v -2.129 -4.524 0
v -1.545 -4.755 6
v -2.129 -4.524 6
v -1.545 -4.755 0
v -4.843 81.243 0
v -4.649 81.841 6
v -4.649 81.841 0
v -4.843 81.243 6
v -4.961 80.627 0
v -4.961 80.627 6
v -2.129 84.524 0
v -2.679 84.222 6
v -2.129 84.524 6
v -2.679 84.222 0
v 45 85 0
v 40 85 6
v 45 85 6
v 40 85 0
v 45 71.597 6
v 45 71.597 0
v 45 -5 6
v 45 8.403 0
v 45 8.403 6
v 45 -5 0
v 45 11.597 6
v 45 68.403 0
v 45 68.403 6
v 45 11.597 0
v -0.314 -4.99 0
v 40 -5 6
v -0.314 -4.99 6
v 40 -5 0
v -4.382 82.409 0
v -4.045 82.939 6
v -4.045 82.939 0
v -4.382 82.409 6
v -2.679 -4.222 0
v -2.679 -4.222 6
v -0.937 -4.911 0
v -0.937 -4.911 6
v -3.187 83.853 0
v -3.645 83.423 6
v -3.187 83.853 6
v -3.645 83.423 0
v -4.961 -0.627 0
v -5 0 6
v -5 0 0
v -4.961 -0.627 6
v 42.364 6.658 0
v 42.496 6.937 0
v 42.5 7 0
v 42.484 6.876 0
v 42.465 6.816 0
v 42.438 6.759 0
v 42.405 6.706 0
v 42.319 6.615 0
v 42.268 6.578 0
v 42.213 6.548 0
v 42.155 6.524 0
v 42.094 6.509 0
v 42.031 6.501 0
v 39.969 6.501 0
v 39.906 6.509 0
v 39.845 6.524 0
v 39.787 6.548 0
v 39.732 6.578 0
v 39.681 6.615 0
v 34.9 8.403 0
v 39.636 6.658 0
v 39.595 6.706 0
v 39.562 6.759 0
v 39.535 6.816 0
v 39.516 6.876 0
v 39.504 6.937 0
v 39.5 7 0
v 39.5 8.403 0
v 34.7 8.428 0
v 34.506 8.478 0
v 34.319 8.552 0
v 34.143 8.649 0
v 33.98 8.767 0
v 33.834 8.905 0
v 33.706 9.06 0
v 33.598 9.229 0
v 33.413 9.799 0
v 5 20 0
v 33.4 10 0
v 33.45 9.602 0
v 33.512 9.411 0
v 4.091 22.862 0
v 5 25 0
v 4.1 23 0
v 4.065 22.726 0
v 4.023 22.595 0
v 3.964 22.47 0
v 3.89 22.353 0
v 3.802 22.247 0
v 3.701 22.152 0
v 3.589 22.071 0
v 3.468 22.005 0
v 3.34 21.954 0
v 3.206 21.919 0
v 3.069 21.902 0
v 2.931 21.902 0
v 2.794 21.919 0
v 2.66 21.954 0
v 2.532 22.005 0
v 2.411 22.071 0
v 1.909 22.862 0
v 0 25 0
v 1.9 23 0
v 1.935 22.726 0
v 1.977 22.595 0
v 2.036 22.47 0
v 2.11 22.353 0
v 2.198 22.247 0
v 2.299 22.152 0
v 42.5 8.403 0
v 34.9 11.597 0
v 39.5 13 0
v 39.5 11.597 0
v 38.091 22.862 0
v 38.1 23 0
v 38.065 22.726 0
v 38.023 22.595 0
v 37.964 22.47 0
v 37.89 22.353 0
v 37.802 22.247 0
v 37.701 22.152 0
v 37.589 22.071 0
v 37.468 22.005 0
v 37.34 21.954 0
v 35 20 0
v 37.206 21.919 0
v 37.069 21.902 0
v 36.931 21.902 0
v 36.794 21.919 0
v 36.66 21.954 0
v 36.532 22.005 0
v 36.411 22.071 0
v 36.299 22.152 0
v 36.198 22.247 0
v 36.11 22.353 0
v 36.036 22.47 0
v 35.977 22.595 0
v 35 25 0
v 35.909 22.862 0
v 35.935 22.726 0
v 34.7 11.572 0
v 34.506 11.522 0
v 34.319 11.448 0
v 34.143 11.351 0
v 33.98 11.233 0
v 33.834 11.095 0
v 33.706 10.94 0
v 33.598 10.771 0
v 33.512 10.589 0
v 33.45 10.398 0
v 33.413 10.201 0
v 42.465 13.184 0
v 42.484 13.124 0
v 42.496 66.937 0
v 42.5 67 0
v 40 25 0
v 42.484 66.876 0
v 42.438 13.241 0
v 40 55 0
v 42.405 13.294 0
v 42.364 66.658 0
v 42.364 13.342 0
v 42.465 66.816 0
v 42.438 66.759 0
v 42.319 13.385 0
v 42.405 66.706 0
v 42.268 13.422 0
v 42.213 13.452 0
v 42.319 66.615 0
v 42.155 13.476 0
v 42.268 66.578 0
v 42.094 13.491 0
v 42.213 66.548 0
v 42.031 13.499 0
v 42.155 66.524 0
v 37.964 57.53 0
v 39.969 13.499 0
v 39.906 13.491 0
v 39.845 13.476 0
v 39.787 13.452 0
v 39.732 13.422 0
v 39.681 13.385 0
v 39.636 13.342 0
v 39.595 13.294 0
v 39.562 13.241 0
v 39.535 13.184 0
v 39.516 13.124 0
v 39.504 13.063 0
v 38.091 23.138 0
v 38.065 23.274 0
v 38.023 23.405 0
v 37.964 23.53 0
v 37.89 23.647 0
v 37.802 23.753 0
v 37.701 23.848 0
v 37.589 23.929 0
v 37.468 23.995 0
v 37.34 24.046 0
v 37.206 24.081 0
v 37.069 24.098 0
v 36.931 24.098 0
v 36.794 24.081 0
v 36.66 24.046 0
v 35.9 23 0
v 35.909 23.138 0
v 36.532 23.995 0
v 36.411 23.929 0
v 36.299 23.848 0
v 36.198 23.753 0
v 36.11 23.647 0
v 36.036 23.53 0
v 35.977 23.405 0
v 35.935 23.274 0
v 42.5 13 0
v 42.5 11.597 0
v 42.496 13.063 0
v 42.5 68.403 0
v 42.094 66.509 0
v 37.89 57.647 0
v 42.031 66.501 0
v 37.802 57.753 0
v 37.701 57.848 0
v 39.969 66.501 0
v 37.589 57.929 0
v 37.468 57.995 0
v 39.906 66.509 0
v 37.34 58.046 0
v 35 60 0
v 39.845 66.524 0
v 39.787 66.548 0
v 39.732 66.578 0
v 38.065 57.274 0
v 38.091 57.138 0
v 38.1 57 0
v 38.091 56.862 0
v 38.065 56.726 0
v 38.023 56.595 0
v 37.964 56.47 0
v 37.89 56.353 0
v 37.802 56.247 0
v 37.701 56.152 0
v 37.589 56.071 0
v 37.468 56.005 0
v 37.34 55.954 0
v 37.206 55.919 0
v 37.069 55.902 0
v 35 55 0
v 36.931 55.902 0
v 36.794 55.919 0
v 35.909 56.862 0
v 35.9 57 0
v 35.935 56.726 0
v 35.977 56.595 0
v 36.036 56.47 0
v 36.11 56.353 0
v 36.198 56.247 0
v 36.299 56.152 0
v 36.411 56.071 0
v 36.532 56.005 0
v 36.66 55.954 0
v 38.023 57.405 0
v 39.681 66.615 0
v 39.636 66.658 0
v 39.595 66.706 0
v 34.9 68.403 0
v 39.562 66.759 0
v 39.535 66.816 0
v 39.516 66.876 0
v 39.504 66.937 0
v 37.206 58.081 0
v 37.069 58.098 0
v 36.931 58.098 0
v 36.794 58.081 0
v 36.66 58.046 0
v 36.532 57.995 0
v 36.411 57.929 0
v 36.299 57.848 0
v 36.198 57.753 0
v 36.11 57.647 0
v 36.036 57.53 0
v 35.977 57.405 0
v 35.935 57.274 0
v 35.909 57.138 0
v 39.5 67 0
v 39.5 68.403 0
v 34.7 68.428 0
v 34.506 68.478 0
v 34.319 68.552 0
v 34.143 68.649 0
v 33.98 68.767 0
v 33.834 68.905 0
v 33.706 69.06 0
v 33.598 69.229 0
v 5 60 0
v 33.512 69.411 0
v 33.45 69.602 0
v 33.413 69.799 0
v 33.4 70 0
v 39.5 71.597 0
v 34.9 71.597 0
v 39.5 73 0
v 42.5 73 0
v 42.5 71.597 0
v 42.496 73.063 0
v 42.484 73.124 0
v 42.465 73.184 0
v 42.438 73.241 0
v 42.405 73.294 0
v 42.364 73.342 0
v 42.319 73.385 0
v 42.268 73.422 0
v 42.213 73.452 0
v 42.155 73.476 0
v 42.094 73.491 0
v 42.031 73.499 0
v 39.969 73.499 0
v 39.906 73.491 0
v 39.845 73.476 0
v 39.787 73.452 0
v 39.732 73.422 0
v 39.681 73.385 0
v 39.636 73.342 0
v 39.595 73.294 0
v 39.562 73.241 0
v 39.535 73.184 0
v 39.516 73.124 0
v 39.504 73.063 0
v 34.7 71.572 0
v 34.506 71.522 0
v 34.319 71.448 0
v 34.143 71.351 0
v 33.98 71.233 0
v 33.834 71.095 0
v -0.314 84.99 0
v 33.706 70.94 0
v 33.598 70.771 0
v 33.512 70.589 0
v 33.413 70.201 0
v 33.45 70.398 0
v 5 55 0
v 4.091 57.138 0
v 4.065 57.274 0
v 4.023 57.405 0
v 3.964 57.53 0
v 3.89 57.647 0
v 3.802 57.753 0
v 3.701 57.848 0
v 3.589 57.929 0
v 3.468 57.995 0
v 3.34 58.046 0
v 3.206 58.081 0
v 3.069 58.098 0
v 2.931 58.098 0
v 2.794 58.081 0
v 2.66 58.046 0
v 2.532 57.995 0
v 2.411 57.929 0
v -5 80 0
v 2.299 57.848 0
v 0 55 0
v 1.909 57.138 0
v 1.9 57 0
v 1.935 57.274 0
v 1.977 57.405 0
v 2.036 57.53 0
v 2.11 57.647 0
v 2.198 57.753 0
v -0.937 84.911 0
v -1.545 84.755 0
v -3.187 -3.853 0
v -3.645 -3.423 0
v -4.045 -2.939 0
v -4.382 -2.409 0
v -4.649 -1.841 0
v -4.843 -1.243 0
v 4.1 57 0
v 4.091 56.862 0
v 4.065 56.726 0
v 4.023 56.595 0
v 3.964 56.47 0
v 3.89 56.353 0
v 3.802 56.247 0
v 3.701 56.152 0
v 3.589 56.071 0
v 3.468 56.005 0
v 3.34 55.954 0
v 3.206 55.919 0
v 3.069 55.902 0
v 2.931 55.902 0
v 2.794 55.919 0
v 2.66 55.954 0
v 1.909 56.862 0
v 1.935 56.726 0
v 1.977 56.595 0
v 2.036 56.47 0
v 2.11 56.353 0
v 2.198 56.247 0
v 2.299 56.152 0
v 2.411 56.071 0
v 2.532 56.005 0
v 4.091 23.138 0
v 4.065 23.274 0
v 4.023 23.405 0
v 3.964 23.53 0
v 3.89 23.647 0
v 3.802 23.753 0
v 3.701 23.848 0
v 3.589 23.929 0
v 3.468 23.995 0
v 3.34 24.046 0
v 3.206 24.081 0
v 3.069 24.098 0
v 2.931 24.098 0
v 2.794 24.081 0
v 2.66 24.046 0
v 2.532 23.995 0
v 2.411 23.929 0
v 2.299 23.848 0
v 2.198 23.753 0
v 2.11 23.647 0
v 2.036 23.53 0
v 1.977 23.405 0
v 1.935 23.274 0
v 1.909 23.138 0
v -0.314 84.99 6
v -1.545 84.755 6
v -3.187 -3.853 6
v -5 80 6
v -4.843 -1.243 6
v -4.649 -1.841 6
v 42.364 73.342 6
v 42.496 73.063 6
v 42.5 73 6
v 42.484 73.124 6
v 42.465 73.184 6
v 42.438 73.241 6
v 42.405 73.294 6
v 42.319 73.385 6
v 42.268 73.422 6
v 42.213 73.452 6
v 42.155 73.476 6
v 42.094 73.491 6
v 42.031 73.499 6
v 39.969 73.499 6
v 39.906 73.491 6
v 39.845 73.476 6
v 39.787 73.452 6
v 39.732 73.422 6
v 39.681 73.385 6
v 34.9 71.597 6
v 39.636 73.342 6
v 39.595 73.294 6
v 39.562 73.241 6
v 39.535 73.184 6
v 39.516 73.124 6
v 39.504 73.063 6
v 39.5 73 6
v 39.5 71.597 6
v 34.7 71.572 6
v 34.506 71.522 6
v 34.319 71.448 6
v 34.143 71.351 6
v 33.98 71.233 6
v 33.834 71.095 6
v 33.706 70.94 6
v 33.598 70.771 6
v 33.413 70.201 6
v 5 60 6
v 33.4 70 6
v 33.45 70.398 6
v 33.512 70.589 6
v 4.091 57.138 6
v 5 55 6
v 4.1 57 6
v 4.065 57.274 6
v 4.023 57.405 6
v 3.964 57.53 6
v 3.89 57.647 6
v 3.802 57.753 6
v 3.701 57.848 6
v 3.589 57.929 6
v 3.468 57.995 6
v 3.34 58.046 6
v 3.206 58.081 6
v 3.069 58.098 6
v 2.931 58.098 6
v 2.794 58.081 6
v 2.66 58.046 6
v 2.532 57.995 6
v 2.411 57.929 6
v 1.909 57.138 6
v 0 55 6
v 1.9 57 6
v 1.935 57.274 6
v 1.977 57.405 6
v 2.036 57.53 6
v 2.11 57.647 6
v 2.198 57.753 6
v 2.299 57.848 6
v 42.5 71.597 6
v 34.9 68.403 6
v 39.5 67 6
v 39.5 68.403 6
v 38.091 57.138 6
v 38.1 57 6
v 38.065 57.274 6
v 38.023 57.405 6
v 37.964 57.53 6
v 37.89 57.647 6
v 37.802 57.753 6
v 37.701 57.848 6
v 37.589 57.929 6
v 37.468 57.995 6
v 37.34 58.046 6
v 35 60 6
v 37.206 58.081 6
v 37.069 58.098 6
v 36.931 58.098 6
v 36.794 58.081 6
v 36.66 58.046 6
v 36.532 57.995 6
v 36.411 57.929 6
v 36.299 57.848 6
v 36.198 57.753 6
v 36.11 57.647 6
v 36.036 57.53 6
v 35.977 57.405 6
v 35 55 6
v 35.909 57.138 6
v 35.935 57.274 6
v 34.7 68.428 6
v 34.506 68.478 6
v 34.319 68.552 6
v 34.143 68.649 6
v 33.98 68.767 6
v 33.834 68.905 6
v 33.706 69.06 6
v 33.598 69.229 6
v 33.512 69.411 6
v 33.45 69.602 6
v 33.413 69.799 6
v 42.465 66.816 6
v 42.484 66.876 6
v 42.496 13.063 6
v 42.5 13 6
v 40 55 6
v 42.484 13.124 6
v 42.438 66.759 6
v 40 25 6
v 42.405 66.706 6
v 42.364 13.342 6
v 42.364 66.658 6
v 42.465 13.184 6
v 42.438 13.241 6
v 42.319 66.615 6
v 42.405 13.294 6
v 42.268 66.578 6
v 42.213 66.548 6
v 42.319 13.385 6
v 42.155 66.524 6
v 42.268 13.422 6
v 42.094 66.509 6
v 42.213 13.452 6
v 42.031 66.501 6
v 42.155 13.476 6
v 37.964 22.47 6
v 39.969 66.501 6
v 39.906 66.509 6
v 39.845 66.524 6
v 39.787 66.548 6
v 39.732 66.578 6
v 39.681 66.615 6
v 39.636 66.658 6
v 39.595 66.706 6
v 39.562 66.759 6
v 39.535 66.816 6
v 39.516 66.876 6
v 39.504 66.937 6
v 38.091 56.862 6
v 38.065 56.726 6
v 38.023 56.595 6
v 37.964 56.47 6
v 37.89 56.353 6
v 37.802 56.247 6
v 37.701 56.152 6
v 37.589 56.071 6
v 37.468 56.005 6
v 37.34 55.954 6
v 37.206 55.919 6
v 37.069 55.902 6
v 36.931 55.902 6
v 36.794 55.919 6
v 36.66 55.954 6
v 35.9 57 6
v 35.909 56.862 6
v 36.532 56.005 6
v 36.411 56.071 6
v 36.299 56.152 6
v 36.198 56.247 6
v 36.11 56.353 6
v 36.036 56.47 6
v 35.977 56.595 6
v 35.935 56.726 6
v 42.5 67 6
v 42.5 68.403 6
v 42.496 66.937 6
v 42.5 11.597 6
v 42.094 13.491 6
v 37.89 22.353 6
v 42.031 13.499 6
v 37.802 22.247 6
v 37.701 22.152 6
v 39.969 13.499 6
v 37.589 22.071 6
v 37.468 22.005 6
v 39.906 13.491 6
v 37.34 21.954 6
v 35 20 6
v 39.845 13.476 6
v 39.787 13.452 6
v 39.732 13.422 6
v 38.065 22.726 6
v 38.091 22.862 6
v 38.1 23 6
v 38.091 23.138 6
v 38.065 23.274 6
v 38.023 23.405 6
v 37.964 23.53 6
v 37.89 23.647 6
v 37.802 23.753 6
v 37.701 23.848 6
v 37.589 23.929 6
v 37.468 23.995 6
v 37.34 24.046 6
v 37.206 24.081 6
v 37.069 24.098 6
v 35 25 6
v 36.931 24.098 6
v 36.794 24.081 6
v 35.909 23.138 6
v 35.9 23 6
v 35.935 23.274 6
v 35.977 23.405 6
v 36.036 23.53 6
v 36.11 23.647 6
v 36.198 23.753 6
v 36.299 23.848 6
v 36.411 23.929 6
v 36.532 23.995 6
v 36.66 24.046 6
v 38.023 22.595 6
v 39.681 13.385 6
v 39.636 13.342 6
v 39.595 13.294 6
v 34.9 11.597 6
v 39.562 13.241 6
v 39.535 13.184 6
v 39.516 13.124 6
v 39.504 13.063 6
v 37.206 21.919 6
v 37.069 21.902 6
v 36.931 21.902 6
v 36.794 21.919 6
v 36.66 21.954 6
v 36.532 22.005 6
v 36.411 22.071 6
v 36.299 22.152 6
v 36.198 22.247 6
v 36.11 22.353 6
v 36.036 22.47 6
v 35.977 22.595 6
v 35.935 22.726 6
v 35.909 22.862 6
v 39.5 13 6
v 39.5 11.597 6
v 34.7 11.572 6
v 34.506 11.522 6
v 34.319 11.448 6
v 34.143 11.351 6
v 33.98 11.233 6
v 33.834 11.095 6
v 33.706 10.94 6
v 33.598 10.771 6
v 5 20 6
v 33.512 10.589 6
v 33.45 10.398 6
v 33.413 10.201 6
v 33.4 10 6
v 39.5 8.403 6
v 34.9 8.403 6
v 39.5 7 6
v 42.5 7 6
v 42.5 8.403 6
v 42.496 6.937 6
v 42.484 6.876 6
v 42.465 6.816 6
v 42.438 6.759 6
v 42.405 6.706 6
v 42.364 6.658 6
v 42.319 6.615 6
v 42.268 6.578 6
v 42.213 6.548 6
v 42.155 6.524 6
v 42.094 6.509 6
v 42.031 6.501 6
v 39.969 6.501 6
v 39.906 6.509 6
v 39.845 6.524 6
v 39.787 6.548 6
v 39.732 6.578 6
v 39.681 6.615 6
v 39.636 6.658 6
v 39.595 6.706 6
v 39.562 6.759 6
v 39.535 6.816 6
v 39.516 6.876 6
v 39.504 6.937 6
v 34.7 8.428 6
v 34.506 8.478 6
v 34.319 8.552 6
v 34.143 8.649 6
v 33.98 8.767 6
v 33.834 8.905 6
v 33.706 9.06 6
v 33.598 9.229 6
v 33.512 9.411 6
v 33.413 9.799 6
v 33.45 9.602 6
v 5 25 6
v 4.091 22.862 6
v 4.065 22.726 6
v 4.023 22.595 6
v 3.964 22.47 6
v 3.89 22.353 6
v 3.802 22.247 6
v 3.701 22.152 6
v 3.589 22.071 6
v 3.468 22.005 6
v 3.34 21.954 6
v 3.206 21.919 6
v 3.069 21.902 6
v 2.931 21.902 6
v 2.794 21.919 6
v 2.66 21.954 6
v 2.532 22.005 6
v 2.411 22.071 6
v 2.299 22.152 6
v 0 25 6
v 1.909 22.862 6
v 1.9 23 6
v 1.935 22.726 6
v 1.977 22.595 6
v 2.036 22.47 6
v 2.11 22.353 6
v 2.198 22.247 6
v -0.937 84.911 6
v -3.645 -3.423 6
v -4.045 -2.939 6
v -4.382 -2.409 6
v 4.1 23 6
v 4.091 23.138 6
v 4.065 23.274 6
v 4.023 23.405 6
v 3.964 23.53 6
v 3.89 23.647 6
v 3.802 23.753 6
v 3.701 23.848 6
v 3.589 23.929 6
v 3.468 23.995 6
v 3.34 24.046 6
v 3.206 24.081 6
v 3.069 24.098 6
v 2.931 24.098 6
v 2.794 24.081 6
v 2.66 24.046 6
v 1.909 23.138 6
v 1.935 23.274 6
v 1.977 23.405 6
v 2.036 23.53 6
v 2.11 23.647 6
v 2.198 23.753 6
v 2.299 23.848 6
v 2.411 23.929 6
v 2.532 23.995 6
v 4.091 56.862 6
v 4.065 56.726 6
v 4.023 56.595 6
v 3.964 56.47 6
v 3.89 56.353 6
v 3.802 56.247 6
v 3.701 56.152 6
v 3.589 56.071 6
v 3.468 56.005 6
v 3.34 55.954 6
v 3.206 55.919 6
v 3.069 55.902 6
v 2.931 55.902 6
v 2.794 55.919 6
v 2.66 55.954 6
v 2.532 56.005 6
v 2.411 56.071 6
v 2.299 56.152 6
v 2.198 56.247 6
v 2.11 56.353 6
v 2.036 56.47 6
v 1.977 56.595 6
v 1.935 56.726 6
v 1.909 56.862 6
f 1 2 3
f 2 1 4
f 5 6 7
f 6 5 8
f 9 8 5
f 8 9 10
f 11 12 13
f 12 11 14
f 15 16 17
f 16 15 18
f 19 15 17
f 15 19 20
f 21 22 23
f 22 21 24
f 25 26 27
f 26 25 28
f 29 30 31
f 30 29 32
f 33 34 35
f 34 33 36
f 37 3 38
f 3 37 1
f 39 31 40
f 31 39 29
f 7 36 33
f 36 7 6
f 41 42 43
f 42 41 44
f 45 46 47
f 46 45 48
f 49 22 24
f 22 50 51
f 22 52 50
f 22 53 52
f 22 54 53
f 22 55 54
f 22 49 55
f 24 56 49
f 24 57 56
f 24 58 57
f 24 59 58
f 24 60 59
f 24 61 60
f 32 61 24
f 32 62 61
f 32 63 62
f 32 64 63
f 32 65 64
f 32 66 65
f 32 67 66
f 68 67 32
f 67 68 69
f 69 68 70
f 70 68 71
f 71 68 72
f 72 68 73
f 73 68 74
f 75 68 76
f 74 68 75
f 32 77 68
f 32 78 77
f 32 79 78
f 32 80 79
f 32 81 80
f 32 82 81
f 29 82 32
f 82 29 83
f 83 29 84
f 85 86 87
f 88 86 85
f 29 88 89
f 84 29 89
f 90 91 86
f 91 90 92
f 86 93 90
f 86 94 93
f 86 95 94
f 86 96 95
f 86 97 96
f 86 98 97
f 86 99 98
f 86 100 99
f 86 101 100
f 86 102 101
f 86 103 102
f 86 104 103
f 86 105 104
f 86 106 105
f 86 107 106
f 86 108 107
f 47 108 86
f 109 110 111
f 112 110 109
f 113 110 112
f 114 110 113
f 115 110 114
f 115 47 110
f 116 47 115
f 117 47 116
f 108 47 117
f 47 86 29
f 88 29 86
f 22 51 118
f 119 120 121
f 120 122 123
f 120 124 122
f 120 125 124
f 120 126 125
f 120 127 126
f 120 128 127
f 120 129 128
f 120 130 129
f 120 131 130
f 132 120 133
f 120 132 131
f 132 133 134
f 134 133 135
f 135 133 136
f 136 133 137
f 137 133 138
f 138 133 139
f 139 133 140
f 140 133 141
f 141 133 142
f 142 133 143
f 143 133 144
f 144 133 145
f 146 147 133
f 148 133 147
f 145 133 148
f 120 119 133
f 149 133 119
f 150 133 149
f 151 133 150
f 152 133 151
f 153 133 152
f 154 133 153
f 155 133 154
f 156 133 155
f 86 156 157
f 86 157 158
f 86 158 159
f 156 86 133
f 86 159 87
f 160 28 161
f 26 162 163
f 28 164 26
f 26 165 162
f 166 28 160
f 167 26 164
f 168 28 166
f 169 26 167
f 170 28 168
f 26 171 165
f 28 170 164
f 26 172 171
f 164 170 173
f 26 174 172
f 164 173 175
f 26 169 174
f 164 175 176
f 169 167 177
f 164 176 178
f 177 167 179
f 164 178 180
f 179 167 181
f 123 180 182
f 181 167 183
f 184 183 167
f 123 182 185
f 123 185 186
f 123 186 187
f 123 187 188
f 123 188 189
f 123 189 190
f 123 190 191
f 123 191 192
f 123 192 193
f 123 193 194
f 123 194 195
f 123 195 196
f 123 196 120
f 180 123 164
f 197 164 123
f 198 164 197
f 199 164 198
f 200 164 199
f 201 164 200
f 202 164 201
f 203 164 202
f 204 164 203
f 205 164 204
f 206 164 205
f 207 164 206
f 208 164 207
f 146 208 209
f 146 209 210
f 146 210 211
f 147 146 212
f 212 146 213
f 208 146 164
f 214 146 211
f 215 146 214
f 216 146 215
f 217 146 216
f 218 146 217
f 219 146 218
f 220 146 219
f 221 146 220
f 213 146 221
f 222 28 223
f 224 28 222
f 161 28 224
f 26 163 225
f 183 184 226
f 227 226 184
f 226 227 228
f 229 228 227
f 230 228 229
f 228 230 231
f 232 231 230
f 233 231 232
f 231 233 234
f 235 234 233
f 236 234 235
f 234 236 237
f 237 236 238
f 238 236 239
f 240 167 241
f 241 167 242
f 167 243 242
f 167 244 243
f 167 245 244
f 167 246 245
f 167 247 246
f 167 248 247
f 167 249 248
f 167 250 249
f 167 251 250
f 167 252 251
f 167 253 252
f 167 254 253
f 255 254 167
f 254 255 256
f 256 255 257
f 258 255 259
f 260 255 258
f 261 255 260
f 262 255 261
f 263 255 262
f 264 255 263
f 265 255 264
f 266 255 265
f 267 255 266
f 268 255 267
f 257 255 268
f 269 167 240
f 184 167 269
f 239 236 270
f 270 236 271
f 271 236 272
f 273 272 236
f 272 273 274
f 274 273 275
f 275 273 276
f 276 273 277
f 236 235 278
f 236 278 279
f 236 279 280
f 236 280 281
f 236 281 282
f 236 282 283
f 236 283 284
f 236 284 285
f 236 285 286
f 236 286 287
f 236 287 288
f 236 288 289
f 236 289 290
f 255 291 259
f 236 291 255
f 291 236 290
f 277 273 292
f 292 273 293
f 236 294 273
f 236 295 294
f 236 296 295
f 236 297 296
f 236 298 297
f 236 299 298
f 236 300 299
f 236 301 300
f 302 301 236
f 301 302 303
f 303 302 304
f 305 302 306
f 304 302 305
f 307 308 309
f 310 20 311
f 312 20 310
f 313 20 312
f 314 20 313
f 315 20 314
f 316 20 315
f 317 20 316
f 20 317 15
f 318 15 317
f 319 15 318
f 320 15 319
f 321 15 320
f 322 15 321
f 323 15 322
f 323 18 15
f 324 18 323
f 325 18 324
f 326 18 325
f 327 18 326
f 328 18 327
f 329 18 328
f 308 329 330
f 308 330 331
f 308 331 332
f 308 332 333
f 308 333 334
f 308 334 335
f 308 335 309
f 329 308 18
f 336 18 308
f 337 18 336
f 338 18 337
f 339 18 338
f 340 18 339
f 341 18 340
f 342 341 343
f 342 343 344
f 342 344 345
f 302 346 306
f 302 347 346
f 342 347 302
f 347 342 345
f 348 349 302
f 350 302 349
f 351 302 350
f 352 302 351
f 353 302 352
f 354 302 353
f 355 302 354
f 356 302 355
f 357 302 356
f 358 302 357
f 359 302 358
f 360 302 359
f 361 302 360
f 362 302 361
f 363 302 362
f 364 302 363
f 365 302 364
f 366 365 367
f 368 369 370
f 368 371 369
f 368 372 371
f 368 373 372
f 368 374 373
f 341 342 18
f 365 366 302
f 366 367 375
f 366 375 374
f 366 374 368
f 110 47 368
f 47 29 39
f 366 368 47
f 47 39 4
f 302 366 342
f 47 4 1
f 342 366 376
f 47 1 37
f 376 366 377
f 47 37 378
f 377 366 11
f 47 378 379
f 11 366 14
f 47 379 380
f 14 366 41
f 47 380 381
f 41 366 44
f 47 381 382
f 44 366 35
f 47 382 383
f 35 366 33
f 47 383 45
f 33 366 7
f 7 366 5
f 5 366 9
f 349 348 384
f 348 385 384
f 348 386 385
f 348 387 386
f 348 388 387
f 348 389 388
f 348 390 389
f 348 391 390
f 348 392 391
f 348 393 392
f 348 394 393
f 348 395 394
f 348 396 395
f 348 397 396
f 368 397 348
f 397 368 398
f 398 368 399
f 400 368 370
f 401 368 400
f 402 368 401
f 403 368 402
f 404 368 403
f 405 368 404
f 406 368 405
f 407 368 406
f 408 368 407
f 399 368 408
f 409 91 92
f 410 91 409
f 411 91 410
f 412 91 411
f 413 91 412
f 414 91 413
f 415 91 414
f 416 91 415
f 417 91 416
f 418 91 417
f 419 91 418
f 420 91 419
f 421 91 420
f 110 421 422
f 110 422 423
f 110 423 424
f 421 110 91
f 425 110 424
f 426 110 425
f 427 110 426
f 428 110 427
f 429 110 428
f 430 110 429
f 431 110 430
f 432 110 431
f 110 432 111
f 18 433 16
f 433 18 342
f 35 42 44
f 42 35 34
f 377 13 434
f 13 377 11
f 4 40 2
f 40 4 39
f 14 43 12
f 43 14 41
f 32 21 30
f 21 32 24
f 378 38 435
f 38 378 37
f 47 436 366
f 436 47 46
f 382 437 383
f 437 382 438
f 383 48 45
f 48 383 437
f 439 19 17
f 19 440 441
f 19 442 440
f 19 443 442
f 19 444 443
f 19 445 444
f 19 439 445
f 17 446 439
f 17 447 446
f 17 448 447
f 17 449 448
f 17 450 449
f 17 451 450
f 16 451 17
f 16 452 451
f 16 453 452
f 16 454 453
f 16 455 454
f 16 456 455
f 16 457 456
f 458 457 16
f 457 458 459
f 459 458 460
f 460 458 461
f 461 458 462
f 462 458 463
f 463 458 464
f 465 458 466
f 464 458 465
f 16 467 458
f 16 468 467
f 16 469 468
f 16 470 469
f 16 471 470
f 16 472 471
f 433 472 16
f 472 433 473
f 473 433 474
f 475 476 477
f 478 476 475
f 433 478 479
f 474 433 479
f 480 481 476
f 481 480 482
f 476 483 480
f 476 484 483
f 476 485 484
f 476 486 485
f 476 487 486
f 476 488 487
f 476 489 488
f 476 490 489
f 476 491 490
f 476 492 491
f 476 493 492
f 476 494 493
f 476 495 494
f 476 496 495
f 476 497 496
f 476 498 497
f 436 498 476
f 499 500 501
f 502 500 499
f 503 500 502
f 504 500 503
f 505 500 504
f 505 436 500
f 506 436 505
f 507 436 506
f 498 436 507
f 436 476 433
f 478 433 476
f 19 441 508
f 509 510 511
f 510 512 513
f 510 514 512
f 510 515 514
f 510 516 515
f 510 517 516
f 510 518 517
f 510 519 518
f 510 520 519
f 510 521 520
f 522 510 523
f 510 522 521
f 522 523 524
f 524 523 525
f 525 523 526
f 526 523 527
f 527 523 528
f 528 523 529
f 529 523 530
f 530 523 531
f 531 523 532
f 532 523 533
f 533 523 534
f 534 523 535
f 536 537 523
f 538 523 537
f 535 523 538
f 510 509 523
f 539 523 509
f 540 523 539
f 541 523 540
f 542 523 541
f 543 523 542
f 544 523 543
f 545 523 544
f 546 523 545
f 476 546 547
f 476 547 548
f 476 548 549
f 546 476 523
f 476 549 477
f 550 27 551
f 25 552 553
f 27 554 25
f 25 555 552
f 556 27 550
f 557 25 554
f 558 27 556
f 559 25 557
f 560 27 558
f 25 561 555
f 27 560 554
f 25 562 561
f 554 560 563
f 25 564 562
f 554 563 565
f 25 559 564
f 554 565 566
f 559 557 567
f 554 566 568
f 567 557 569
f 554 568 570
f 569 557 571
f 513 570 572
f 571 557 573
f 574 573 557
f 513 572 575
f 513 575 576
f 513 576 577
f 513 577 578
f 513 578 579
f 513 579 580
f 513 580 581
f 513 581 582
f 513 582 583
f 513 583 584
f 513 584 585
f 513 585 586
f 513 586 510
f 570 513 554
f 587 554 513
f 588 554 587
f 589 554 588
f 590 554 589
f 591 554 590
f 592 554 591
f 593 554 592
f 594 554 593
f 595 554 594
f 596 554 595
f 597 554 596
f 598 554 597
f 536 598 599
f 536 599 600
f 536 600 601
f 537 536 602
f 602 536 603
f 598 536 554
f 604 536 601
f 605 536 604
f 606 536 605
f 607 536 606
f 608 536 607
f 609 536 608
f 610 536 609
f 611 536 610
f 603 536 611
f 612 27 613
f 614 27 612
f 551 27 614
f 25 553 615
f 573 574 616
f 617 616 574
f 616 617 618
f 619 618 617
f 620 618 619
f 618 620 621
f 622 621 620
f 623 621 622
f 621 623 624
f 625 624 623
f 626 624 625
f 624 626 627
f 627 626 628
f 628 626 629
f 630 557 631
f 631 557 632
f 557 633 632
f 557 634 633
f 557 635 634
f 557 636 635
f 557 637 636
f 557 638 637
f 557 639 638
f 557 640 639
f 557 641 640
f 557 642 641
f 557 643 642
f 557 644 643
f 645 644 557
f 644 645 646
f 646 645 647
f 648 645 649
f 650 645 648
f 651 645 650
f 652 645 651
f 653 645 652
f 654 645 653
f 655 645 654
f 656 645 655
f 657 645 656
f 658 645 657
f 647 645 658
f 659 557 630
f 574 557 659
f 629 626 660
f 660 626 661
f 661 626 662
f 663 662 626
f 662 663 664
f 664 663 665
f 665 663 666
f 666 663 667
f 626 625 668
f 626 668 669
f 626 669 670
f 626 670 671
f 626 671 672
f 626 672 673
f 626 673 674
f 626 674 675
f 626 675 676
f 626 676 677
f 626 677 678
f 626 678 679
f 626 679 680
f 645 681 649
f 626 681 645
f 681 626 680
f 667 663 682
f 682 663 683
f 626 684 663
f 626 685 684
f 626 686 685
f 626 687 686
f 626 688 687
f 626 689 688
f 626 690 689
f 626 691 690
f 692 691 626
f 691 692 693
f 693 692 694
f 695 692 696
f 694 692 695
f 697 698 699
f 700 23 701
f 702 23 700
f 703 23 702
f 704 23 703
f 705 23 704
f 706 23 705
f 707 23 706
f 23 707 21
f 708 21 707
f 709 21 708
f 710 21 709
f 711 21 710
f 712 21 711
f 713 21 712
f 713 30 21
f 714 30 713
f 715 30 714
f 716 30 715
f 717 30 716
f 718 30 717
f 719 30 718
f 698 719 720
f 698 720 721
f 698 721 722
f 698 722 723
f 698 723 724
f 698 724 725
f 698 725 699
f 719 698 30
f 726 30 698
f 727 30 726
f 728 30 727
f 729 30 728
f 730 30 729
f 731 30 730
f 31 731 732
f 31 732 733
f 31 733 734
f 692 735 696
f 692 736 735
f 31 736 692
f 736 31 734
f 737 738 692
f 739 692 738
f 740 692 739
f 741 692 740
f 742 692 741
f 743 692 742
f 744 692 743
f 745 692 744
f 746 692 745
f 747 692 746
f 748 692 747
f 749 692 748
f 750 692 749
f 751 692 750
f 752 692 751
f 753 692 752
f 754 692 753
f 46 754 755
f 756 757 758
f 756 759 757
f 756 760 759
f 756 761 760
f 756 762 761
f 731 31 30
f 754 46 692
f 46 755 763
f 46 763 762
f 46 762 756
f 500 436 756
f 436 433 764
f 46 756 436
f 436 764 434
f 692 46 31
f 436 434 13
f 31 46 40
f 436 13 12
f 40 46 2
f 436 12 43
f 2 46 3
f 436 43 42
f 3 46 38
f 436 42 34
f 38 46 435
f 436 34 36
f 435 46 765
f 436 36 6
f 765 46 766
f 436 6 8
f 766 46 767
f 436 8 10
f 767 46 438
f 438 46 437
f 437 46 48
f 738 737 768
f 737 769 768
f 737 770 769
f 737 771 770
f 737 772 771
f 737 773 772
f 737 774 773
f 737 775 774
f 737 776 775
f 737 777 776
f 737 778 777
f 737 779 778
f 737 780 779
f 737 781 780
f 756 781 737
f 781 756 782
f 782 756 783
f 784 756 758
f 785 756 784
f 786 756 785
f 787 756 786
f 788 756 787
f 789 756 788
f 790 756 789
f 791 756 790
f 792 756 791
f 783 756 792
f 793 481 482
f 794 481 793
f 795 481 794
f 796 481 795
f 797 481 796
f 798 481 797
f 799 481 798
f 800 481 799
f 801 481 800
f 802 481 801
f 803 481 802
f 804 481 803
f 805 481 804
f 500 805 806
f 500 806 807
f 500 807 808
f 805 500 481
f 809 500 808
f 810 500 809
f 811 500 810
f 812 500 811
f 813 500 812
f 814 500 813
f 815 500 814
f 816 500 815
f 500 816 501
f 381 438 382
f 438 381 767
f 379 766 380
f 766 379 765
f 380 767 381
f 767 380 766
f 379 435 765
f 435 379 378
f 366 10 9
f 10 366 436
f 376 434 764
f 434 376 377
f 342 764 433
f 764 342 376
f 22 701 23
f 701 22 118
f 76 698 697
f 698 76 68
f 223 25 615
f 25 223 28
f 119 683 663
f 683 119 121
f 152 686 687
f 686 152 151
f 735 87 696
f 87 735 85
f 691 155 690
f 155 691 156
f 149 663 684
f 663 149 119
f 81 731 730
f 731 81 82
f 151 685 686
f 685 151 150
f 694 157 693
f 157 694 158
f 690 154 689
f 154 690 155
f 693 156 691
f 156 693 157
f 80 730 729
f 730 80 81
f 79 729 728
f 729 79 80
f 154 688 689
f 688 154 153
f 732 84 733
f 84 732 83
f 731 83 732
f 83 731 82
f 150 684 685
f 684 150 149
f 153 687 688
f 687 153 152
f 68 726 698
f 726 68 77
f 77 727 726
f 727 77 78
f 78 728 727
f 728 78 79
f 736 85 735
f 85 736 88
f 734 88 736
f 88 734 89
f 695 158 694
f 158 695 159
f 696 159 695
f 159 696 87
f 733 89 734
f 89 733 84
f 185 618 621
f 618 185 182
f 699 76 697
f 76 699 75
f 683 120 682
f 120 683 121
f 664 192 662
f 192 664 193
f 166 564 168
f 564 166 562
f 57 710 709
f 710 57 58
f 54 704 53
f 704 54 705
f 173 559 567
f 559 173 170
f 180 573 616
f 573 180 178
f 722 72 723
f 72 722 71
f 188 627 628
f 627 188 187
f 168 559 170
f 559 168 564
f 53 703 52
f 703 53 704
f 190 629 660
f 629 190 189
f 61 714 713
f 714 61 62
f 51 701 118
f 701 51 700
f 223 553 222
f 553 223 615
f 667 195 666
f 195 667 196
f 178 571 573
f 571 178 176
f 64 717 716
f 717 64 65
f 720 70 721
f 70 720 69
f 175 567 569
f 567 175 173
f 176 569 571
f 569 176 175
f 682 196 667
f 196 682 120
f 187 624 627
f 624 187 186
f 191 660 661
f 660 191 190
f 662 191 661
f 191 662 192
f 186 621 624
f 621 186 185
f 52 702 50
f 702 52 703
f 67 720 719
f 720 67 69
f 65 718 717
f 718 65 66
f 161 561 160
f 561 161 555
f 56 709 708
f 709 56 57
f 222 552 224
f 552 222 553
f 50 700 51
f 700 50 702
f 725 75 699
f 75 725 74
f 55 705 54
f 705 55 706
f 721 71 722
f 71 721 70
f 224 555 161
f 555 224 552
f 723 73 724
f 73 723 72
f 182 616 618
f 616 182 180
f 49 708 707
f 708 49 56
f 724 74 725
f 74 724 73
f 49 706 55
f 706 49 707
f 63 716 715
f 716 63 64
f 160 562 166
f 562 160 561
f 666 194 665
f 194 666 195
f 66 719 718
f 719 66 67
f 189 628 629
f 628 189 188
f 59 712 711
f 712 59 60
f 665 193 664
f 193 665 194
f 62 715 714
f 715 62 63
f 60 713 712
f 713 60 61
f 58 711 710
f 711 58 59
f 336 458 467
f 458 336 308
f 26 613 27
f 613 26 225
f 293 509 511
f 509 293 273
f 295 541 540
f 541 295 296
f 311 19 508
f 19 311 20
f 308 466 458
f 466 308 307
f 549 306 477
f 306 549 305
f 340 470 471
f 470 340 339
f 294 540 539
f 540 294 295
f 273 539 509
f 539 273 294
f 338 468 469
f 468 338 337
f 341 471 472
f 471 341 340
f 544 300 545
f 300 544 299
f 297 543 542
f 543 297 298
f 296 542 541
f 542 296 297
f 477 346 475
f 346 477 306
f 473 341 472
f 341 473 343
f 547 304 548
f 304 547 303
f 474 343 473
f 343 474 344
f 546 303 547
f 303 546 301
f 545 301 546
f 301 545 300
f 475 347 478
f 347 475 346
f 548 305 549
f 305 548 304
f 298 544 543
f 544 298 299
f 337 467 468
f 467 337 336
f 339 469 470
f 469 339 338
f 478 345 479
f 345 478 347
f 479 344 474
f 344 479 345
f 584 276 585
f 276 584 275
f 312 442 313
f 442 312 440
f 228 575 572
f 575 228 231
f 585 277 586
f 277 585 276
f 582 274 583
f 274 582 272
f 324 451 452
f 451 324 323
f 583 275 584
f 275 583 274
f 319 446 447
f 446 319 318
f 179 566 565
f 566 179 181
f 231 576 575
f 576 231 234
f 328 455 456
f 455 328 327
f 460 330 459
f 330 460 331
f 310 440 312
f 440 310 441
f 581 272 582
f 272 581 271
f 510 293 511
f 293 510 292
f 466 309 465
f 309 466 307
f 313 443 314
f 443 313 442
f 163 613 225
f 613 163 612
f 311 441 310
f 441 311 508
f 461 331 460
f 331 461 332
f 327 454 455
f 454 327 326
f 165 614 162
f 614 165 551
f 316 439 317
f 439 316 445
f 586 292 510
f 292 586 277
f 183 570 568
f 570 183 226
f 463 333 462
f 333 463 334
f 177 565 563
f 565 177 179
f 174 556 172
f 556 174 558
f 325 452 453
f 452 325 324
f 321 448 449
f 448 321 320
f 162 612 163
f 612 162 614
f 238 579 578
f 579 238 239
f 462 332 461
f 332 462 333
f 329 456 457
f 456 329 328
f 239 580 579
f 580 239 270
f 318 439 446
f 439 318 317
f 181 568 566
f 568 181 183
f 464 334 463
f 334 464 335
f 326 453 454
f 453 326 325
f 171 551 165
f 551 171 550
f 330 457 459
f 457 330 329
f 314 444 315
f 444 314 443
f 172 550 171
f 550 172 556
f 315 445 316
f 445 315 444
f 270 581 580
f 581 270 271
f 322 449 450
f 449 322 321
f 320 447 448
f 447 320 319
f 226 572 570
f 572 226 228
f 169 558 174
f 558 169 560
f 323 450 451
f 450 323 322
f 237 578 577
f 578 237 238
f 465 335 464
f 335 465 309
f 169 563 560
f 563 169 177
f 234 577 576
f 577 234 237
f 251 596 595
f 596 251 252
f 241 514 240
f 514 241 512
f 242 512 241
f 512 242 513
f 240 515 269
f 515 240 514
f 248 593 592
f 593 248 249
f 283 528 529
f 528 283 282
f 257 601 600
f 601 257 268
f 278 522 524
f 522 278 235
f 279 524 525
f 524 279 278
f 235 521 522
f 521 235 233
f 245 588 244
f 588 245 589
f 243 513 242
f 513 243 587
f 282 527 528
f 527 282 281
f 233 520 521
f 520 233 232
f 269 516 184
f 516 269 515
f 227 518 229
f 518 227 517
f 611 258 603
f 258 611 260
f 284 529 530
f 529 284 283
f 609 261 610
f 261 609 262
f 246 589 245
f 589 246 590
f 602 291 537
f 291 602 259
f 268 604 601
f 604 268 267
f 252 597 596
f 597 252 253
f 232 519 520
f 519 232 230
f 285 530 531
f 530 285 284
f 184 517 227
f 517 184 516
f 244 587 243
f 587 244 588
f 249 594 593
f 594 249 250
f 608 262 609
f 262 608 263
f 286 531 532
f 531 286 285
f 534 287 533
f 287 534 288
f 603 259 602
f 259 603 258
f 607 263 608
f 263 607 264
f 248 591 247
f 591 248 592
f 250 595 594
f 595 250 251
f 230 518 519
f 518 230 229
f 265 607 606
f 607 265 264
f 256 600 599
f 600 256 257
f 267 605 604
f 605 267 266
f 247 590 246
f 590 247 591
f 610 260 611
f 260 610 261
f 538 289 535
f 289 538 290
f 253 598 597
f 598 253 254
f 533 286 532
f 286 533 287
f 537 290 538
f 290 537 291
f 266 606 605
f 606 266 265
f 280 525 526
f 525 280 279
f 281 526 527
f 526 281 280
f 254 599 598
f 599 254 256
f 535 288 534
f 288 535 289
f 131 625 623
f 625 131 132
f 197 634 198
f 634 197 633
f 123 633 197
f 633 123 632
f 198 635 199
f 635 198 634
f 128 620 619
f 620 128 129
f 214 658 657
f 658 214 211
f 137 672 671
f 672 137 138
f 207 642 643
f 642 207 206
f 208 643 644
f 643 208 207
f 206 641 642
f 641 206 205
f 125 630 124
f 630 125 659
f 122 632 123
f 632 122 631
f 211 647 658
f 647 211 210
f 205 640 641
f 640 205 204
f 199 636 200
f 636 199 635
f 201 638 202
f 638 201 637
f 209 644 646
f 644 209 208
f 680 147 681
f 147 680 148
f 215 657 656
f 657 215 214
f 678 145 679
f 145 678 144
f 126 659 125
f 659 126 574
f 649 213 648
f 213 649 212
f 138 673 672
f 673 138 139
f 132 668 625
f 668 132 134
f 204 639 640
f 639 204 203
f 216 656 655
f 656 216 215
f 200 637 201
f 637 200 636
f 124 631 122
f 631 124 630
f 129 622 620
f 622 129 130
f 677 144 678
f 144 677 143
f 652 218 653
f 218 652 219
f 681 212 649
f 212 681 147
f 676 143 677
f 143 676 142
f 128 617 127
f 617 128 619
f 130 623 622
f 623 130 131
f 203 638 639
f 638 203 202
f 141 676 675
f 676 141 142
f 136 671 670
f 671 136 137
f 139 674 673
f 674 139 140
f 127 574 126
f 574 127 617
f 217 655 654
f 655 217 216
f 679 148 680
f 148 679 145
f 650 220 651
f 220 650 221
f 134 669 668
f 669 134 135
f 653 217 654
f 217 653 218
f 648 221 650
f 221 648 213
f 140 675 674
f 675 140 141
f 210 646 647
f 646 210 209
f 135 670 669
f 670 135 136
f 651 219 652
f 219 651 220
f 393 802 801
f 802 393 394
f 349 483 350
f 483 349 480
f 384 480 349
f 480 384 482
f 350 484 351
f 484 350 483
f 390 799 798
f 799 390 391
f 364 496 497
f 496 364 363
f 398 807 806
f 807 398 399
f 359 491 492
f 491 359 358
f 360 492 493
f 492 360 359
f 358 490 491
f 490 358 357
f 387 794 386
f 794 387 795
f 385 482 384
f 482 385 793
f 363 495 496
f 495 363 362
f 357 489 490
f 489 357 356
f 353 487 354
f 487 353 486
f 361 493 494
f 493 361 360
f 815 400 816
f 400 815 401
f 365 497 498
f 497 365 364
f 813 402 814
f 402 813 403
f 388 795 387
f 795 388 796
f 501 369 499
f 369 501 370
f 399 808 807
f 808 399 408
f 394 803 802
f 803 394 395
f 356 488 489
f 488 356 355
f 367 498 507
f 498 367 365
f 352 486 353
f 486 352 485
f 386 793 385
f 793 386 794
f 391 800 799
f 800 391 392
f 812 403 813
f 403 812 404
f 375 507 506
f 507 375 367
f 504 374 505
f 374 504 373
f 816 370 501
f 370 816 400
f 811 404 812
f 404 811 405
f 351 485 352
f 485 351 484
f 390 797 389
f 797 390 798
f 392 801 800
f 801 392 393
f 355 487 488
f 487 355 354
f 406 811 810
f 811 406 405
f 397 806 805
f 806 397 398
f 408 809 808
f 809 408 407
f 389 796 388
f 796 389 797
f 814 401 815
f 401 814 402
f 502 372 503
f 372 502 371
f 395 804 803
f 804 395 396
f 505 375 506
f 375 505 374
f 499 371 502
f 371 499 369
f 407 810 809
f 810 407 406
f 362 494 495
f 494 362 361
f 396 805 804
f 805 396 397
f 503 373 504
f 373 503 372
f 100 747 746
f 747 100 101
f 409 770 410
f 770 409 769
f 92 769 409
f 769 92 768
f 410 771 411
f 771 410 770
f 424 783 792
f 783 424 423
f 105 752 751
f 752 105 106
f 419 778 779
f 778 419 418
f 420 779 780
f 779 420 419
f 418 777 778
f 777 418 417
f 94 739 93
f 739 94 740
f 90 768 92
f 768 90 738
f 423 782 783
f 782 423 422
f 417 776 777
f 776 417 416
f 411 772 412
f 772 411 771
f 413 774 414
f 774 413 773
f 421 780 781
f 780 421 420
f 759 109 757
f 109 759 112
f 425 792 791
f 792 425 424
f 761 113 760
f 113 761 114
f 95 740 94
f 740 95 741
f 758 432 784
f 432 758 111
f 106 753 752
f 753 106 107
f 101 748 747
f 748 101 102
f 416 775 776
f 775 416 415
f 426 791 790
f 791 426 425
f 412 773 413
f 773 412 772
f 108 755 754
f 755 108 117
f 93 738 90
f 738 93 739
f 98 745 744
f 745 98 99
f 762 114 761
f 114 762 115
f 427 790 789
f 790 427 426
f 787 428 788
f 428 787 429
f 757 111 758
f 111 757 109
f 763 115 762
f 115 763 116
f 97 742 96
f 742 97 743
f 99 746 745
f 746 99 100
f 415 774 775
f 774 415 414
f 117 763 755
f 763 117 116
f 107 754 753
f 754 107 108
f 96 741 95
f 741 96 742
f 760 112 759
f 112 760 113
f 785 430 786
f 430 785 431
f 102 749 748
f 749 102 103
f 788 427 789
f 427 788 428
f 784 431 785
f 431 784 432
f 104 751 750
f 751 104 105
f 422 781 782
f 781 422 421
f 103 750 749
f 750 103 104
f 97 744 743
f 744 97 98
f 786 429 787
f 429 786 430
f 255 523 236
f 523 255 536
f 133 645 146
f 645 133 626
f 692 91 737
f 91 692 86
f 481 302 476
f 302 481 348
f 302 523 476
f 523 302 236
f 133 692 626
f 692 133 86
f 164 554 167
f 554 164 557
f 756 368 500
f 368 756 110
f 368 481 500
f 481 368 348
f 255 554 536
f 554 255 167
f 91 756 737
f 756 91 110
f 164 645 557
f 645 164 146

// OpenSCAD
$cameraholes=34;

module cam() {
	// pcb:
	translate([-cx/2, -cy/2, 0]) {
	color("DarkSlateBlue") 
	difference() {
		cube([cx,cy,1]);
		
		translate([5,5,-1]) cylinder(d=2.5,h=6);
		translate([5,5+28,-1]) cylinder(d=2.5,h=6);
		translate([5+28,5+28,-1]) cylinder(d=2.5,h=6);
		translate([5+28,5,-1]) cylinder(d=2.5,h=6);
	}
	// m12 lens block:
	color([0.1,0.1,0.1]) {
		translate([cx/2, cy/2, 1]) cylinder(d=14,h=20);
	}
	}
}

$fn=50;
$thickness=6;
$width=80;
$depth=40;
$drill3=3.2;
$drill2=2.2;

difference() {
    hull() {
        translate([0,0,0]) cylinder(r=5,h=$thickness);
        translate([0,$width,0]) cylinder(r=5,h=$thickness);
        translate([$depth,-5,0]) cube([5,5,$thickness]);
        translate([$depth,$width,0]) cube([5,5,$thickness]);
    }

    // Captive nuts
    hull() {
        translate([$depth-5,10,-1]) cylinder(r=$drill3/2,h=$thickness+2);
        translate([$depth+10,10,-1]) cylinder(r=$drill3/2,h=$thickness+2);
    }
    hull() {
        translate([$depth+0,10-3,-1]) cylinder(r=0.5,h=$thickness+2);
        translate([$depth+0,10+3,-1]) cylinder(r=0.5,h=$thickness+2);
        translate([$depth+2,10-3,-1]) cylinder(r=0.5,h=$thickness+2);
        translate([$depth+2,10+3,-1]) cylinder(r=0.5,h=$thickness+2);
    }
    hull() {
        translate([$depth-5,$width-10,-1]) cylinder(r=$drill3/2,h=$thickness+2);
        translate([$depth+10,$width-10,-1]) cylinder(r=$drill3/2,h=$thickness+2);
    }
    hull() {
        translate([$depth+0,$width-10-3,-1]) cylinder(r=0.5,h=$thickness+2);
        translate([$depth+0,$width-10+3,-1]) cylinder(r=0.5,h=$thickness+2);
        translate([$depth+2,$width-10-3,-1]) cylinder(r=0.5,h=$thickness+2);
        translate([$depth+2,$width-10+3,-1]) cylinder(r=0.5,h=$thickness+2);
    }

    translate([$depth/2+$cameraholes/2, $width/2+$cameraholes/2, -1])cylinder(r=$drill2/2,h=$thickness+2);
    translate([$depth/2+$cameraholes/2, $width/2-$cameraholes/2, -1])cylinder(r=$drill2/2,h=$thickness+2);
    translate([$depth/2-$cameraholes/2, $width/2+$cameraholes/2, -1])cylinder(r=$drill2/2,h=$thickness+2);
    translate([$depth/2-$cameraholes/2, $width/2-$cameraholes/2, -1])cylinder(r=$drill2/2,h=$thickness+2);
    
    translate([$depth/2-15,$width/2-20,-1]) cube([30,40,$thickness+2]);
    translate([$depth/2-20,$width/2-15,-1]) cube([40,30,$thickness+2]);
}
